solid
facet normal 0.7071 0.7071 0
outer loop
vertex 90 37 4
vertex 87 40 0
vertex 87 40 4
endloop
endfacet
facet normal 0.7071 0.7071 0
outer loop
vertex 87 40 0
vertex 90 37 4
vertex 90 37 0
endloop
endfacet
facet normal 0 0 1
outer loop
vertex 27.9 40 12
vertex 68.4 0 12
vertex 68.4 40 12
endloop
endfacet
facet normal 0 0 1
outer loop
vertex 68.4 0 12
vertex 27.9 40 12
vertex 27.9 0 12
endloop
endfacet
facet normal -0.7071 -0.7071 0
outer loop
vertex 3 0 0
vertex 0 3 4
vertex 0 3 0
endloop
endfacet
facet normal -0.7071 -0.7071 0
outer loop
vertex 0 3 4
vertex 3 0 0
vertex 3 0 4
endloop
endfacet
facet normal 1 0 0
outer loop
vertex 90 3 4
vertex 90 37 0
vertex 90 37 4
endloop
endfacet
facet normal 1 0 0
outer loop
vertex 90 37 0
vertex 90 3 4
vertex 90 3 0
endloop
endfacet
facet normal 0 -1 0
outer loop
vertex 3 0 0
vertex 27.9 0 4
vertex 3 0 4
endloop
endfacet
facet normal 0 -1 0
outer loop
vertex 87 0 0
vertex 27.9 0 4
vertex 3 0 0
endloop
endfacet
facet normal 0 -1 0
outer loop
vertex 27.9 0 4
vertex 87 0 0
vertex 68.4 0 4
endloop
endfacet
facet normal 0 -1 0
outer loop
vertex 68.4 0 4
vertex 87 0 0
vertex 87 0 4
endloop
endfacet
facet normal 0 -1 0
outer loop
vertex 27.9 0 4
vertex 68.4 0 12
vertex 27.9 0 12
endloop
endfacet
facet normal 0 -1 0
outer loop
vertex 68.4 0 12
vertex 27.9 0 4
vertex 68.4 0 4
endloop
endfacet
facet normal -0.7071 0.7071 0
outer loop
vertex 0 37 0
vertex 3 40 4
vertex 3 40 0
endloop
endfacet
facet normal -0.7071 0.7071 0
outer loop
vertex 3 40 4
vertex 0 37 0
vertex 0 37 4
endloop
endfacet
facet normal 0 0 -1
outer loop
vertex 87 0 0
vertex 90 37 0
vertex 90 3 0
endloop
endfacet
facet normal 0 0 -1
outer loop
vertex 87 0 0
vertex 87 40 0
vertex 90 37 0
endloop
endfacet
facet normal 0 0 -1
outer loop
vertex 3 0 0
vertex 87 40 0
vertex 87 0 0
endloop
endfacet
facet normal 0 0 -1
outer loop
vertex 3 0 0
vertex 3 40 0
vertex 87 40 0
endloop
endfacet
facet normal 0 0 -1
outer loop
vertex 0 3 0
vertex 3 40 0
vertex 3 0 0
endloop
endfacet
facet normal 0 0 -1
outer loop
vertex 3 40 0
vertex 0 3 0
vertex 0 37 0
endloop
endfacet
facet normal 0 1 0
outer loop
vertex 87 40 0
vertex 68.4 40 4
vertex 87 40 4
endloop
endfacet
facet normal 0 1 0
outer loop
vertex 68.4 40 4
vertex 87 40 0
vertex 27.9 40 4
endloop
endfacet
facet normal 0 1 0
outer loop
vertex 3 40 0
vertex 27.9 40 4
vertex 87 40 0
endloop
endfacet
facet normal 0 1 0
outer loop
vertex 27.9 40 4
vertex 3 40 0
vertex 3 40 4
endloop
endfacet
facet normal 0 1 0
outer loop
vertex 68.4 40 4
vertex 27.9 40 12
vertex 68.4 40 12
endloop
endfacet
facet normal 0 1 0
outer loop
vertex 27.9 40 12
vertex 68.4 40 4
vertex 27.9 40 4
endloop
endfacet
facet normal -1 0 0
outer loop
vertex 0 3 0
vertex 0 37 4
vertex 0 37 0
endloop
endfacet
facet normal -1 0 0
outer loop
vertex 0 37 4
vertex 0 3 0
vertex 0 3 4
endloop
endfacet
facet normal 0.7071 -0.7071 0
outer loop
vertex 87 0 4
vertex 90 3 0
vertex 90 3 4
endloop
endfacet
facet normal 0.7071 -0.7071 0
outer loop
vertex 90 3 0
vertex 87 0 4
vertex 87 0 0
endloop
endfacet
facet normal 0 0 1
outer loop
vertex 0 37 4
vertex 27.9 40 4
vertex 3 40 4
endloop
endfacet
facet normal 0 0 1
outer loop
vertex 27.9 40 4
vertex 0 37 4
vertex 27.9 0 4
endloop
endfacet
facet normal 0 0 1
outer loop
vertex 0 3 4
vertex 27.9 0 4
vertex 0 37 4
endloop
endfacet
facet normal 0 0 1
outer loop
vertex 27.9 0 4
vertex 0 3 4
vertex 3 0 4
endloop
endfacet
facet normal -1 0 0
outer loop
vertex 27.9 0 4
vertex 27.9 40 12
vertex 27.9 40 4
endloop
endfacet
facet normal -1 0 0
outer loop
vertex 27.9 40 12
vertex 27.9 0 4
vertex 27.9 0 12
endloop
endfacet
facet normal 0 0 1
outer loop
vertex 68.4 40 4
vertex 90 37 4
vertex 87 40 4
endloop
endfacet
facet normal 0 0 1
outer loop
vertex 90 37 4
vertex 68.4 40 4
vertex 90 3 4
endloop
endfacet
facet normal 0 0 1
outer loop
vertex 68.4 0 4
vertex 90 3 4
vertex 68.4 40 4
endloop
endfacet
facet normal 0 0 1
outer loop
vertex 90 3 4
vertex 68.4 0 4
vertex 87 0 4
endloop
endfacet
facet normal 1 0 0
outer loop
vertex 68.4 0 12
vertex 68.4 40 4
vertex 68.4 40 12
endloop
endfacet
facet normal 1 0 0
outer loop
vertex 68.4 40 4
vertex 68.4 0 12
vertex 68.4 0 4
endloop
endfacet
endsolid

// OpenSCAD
$fn = 32;

// ----------------------------------------------------------------------
// Stepped bar: centerstep, 90 x 40 x 12/4 mm
// ----------------------------------------------------------------------

// --- parameters (mm) ---
bar_l = 90;               // bar length, X
bar_w = 40;               // bar width, Y
plate_t = 12;             // thickness of the thick zone, Z
thin_t = 4;               // thickness of the thin zone
corner_c = 3;             // corner chamfer of the bar
step_cut = 8;             // material removed from the thin zone
thick_from = 27.9;        // start of the thick middle zone
thick_to = 68.4;          // end of the thick middle zone
depth_1 = 8;              // depth of cut 1 from the top face
depth_2 = 8;              // depth of cut 2 from the top face

profile = [[3, 0], [87, 0], [90, 3], [90, 37], [87, 40], [3, 40], [0, 37], [0, 3]];  // primary outline, 8 points, counter clockwise
void_1 = [[-1, -1], [27.9, -1], [27.9, 41], [-1, 41]];  // thin left end, 4 points
void_2 = [[68.4, -1], [91, -1], [91, 41], [68.4, 41]];  // thin right end, 4 points

// --- the one profile operation ---
difference() {
  linear_extrude(height = plate_t) polygon(points = profile);
  translate([0, 0, plate_t - depth_1])
    linear_extrude(height = depth_1 + 1) polygon(points = void_1);
  translate([0, 0, plate_t - depth_2])
    linear_extrude(height = depth_2 + 1) polygon(points = void_2);
}
